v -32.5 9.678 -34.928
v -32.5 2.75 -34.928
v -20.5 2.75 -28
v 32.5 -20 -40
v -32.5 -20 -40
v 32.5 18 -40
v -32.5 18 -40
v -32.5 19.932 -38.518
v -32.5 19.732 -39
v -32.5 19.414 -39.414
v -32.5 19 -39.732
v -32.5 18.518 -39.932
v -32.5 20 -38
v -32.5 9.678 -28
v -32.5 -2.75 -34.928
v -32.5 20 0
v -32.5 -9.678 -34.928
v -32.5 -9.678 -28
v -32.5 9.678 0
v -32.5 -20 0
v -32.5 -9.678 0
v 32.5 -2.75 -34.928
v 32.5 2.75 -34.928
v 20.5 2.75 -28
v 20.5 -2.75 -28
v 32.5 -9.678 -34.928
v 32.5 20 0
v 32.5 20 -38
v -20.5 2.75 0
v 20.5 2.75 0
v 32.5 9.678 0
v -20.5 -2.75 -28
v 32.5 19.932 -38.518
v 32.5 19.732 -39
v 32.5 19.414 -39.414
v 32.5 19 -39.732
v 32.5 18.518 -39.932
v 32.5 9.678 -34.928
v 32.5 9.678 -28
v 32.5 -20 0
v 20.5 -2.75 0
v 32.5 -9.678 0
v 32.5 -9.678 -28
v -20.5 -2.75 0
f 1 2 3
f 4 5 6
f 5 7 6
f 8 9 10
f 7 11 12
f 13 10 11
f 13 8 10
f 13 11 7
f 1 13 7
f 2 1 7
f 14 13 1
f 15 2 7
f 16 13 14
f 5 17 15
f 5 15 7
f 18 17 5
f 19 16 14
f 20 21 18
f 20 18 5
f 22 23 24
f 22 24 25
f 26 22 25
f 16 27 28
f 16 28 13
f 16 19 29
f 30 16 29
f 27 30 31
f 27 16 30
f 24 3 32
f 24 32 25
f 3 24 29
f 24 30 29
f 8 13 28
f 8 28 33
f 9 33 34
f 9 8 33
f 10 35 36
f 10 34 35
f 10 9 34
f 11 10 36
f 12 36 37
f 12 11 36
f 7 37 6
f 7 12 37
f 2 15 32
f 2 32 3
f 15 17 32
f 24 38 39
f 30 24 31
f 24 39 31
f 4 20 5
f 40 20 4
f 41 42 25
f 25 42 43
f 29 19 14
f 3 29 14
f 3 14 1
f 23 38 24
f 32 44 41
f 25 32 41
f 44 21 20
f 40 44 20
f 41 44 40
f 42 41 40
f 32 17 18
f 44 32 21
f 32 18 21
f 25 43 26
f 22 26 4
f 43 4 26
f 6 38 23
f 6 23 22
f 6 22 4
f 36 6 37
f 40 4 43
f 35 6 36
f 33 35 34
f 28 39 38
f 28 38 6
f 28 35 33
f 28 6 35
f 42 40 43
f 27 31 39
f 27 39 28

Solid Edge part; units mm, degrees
sketch "Sketch1" plane through (0, 0, 0) normal (0, 0, 1) x (1, 0, 0)
  line L0 (-32.5, -20) -> (32.5, -20)
  line L1 (32.5, -20) -> (32.5, 20)
  line L2 (32.5, 20) -> (-32.5, 20)
  line L3 (-32.5, 20) -> (-32.5, -20)
extrude "Protrusion1" add sketch "Sketch1" against normal blind 40
sketch "Sketch2" plane through (0, 0, 0) normal (0, 0, 1) x (1, 0, 0)
  line L0 (-32.5, -2.75) -> (32.5, -2.75)
  line L1 (32.5, -2.75) -> (32.5, 2.75)
  line L2 (32.5, 2.75) -> (-32.5, 2.75)
  line L3 (-32.5, 2.75) -> (-32.5, -2.75)
extrude "ExtrudedCutout_1" cut sketch "Sketch2" against normal blind 28
fillet "Round_1" radius 2 1 edges at (0, 20, -40)
chamfer "Chamfer_6" distance 12 angle 30 1 edges at (32.5, 2.75, -14) measured on face at (22.3167, 2.75, -23.0533)
chamfer "Chamfer_7" distance 12 angle 30 1 edges at (32.5, 3.4641, -28) measured on face at (-22.3167, -0.5544, -28)
chamfer "Chamfer_8" distance 12 angle 30 1 edges at (32.5, -2.75, -17.4641) measured on face at (-22.3167, -2.75, -17.1148)
chamfer "Chamfer_9" distance 12 angle 30 1 edges at (-32.5, -2.75, -14) measured on face at (-24.1967, -2.75, -23.0533)
chamfer "Chamfer_10" distance 12 angle 30 1 edges at (-32.5, 2.75, -14) measured on face at (12.1967, 2.75, -23.0533)
chamfer "Chamfer_11" distance 12 angle 30 1 edges at (-32.5, 0, -28) measured on face at (-24.1967, 0.1936, -28)
